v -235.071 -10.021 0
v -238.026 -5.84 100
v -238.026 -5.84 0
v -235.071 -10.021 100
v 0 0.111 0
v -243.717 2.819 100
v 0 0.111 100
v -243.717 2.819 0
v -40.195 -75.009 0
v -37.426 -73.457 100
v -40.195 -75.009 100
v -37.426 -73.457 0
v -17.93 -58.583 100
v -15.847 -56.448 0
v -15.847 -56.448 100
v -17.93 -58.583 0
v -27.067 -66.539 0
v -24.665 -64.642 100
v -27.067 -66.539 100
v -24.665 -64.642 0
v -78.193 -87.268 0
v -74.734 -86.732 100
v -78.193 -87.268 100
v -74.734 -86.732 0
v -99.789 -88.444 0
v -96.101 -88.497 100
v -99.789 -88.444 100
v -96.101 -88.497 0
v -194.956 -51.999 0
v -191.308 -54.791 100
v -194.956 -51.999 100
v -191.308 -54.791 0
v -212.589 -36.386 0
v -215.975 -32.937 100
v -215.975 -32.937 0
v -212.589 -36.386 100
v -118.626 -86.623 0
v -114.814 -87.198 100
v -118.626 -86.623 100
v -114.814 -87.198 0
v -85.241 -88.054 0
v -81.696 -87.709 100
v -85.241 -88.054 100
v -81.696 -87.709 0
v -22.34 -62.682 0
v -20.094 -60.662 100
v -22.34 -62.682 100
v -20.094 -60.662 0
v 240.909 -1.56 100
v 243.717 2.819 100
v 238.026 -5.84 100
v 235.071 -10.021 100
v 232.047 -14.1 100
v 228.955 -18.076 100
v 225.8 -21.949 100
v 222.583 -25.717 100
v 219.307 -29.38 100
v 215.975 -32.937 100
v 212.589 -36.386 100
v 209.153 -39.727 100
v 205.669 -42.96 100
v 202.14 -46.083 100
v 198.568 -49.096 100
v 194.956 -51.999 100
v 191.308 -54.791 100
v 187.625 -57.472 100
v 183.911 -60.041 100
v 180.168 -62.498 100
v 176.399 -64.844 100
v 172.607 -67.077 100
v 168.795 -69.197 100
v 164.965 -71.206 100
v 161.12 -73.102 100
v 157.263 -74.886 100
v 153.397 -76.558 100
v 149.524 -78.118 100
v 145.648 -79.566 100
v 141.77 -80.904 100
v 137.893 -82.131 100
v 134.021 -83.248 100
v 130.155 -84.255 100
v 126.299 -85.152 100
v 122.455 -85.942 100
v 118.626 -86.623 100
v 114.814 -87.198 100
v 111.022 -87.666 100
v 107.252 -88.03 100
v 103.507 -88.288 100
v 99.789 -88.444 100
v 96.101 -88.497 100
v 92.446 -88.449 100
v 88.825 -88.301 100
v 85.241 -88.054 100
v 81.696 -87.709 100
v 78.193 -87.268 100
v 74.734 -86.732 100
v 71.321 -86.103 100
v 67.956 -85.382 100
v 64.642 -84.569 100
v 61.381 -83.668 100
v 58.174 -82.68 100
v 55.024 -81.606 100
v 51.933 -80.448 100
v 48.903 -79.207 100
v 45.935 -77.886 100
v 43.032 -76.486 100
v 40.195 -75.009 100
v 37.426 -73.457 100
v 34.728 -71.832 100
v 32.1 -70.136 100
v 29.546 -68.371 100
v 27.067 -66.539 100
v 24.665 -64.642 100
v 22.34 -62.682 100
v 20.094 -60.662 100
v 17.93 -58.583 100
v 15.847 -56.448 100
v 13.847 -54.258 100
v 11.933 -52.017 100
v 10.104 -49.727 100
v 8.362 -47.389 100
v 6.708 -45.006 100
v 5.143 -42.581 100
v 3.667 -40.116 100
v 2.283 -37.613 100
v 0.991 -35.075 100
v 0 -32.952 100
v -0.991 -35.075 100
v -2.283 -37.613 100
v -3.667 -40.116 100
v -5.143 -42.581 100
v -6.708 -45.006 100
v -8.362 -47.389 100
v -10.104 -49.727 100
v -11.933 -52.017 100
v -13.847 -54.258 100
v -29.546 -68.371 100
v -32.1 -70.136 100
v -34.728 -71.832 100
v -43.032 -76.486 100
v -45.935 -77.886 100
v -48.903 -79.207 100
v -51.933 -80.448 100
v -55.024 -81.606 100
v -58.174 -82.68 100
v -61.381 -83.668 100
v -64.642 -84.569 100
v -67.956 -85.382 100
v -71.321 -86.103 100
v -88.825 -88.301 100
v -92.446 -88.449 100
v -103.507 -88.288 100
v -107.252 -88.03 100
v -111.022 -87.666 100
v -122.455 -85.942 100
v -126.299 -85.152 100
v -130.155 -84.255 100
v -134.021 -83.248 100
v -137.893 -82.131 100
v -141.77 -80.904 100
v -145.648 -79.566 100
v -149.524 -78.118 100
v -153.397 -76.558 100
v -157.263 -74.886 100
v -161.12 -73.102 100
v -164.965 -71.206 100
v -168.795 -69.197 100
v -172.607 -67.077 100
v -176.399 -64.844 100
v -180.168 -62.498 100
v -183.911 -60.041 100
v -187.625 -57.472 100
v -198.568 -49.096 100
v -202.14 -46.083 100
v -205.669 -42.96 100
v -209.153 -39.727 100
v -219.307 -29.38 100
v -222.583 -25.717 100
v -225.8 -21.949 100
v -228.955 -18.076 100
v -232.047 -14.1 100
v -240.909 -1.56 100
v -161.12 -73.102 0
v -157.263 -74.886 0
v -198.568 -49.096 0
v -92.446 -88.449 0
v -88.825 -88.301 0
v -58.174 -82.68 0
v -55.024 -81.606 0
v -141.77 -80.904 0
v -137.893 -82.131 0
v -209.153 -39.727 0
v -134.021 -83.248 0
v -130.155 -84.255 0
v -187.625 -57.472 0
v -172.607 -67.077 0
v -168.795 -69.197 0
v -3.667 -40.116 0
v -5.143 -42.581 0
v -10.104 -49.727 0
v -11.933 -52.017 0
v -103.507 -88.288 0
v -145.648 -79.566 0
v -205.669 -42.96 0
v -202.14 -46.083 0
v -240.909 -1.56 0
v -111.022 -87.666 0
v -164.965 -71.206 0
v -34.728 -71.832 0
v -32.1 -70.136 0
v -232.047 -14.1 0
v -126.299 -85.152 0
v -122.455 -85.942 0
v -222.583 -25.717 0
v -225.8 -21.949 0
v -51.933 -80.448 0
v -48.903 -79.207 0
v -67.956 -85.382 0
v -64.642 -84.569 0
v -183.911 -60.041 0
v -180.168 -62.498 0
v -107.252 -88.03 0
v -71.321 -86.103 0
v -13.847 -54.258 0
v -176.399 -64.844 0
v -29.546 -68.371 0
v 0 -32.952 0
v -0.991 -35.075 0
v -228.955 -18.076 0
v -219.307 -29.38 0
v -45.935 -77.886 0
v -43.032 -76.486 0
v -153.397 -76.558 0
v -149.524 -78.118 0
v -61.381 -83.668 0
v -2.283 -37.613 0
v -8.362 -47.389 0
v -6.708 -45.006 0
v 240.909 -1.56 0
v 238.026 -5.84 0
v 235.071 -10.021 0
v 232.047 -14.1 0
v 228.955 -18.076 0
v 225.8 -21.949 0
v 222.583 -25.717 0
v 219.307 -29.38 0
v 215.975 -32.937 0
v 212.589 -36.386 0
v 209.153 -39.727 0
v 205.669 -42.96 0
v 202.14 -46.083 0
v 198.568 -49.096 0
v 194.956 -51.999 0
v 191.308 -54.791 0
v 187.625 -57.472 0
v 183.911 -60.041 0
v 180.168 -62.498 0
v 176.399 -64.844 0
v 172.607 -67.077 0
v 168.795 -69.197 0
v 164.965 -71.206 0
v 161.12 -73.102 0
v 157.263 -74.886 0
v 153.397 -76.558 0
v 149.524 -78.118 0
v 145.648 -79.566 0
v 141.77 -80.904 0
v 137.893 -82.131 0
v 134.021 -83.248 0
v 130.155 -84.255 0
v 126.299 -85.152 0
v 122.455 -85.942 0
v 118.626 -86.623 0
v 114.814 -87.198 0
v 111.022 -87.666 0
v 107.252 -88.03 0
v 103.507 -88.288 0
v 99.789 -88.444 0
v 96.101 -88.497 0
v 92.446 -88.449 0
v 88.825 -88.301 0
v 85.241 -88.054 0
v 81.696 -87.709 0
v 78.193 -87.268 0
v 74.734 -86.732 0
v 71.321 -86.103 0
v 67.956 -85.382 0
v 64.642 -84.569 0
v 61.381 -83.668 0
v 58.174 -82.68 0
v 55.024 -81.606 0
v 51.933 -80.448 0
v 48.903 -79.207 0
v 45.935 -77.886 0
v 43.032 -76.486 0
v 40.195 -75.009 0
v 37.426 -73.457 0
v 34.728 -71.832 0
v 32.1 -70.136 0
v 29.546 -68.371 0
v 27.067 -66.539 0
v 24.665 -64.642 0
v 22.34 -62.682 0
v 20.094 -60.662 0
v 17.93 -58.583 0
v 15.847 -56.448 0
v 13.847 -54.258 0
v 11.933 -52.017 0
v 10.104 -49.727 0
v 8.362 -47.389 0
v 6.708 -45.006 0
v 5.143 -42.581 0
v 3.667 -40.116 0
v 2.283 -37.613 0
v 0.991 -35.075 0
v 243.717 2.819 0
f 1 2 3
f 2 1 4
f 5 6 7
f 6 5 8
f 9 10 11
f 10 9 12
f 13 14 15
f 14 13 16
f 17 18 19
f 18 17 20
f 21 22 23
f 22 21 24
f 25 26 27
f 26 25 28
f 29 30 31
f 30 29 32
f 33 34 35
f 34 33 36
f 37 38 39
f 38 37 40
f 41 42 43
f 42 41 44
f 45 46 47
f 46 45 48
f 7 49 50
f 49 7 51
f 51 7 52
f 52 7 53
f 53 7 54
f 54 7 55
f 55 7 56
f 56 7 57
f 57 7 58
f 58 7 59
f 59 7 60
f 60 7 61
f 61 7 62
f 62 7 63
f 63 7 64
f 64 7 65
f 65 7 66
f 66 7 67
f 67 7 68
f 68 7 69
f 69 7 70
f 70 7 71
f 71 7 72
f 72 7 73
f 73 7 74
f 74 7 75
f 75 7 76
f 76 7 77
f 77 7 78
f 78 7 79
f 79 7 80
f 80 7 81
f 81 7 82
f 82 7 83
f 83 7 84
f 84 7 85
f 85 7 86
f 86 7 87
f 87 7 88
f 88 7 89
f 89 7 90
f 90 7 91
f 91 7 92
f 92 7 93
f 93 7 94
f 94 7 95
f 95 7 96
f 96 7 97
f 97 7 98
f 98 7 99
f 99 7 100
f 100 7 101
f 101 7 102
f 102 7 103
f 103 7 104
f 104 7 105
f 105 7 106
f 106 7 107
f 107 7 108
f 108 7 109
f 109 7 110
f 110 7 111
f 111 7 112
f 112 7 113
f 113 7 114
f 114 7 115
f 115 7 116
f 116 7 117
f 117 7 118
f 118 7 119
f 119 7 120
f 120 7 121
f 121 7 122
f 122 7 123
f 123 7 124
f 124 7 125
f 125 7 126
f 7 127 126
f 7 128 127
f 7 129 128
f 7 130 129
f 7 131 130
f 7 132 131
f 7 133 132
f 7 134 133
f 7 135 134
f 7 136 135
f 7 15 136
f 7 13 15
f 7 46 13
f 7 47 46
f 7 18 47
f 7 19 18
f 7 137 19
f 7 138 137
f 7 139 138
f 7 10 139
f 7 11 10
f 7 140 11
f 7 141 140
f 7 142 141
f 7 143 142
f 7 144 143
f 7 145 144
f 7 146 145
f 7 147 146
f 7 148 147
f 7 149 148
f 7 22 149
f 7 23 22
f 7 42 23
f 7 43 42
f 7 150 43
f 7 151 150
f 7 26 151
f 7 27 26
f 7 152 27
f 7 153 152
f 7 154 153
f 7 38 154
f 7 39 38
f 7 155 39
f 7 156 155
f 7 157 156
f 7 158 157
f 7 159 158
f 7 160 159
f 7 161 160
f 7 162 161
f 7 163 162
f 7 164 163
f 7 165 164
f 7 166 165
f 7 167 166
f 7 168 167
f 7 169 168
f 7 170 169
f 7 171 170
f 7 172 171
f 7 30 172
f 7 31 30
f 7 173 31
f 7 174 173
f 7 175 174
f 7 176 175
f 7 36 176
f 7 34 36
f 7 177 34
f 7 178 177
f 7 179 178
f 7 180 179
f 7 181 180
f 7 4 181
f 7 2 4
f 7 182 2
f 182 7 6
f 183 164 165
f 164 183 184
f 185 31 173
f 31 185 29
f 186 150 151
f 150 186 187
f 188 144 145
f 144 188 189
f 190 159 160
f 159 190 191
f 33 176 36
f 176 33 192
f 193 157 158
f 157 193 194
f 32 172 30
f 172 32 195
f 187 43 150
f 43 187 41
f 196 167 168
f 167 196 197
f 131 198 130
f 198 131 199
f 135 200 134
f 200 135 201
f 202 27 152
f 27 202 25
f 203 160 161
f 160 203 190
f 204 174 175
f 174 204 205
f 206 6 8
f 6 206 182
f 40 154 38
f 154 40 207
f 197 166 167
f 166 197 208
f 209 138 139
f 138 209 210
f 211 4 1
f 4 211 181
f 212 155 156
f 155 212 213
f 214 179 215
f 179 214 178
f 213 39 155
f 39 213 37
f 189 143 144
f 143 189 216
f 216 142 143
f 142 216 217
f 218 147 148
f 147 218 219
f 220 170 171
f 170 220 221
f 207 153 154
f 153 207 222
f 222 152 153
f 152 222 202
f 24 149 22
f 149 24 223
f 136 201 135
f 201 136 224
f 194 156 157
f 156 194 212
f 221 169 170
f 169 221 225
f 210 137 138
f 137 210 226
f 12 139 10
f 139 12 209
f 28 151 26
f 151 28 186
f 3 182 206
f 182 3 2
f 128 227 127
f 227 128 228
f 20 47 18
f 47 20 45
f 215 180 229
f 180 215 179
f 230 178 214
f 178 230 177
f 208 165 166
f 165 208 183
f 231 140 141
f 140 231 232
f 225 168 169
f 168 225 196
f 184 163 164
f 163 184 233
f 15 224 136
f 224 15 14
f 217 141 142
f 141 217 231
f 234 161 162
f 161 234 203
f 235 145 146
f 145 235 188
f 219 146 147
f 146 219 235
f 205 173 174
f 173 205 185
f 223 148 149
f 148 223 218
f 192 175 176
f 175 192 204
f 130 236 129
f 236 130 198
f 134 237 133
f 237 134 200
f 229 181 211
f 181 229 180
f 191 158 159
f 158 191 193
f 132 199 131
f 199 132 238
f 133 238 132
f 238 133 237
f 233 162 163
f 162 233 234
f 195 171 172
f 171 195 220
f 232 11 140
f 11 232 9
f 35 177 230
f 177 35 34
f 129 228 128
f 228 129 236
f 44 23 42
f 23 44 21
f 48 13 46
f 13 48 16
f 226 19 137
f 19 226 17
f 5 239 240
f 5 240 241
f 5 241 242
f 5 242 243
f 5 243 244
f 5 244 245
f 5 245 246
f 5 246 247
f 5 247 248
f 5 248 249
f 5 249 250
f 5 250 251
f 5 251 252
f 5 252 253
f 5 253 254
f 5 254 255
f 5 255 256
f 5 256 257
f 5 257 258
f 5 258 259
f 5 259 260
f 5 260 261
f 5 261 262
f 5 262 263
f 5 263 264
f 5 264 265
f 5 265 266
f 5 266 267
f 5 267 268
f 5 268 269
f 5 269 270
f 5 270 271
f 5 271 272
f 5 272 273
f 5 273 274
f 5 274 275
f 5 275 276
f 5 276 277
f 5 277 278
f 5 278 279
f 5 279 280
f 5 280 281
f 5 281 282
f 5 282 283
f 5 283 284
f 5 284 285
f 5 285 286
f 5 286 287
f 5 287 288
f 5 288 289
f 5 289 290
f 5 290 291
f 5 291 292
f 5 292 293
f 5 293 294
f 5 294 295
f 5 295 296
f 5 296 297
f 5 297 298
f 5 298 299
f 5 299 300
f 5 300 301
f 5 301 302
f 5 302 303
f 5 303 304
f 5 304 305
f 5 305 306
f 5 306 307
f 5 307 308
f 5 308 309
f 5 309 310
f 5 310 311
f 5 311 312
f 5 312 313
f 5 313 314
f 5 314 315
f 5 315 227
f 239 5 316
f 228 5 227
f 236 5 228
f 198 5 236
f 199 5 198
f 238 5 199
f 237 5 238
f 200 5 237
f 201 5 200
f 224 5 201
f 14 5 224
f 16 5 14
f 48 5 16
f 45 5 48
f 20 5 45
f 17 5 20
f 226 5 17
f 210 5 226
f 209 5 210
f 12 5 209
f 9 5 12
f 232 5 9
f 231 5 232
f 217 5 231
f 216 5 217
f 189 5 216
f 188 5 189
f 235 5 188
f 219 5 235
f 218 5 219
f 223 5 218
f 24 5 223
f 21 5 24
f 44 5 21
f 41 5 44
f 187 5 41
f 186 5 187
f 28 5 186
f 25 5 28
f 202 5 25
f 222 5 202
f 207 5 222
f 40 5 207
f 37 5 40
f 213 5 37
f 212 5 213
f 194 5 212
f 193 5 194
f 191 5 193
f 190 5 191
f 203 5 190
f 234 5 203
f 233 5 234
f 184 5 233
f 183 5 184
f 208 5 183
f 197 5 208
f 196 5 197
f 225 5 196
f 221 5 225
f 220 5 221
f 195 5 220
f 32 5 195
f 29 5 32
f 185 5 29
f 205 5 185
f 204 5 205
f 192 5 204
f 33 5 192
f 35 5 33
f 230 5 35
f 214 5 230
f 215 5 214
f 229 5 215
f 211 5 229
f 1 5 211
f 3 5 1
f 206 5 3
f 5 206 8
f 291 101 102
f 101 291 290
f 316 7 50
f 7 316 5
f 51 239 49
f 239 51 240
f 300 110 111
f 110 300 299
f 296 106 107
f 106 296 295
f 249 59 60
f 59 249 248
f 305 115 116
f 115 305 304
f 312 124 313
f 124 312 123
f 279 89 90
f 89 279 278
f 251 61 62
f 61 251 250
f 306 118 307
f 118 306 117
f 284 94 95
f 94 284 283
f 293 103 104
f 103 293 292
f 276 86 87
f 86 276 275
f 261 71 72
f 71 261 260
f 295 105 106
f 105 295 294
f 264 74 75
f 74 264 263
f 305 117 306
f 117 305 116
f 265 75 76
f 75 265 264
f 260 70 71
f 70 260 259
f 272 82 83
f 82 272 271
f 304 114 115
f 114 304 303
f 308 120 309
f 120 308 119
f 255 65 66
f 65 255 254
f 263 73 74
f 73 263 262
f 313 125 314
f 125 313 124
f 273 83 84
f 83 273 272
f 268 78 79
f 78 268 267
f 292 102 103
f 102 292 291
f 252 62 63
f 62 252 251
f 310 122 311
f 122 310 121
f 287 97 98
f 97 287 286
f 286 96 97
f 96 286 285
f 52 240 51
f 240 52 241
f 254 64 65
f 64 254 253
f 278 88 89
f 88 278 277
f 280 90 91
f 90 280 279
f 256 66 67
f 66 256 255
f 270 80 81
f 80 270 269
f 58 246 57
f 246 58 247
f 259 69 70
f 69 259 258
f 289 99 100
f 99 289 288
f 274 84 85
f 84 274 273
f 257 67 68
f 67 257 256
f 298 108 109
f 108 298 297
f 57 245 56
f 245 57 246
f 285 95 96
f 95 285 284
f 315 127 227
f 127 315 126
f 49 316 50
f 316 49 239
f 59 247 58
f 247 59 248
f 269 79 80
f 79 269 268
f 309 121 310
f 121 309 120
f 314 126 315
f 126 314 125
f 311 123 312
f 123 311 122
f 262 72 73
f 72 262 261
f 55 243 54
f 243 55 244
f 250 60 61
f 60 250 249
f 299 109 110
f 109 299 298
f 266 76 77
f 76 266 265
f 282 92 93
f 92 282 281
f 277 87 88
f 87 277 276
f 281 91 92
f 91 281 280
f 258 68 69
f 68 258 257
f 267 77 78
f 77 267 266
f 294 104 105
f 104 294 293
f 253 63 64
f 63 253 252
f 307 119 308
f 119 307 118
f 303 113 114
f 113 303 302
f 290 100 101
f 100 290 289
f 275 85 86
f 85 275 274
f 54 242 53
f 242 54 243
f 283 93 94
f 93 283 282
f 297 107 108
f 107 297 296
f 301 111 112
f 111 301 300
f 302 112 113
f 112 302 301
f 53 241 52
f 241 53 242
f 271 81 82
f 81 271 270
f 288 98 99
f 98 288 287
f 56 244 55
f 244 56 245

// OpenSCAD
// pitch circle diameter
PCD=3;
// pressure angle
PA=20;
// base circle calculation from Gears and Gear Cutting, Ivan Law, page
// 26, figure 26
base=PCD*cos(PA);

// diametral pitch
DP=20;
// working depth of tooth (from Machinery's Handbook)
D=2/DP;
// minimum whole depth (working depth + clearance, aka "D+f") (from
// Machinery's Handbook)
Df=2.157/DP;
// "addendum" (amount of tooth above the PCD, so PCD+2*addendum = gear
// blank size) (from Machinery's Handbook)
addendum=1/DP;
blankdiameter = PCD + 2*addendum;

pi=3.14159265;
// intersection() {
	translate([10,0,0]) {
		linear_extrude(h=10) {
			for(theta=[0:1:89]) {
				assign(theta2=theta+1) {
					polygon(points=[[0,0], 
							[-base*(theta*sin(theta)+cos(theta)), 
								base*(sin(theta)-theta*cos(theta))],
							[-base*(theta2*sin(theta2)+cos(theta2)), 
								base*(sin(theta2)-theta2*cos(theta2))],
						],
						paths=[[0,1,2]]);
				}
			}
		}
	}
	translate([-10,0,0]) {
		linear_extrude(h=10) {
			for(theta=[0:1:89]) {
				assign(theta2=theta+1) {
					polygon(points=[[0,0], 
							[base*(theta*sin(theta)+cos(theta)), 
								base*(sin(theta)-theta*cos(theta))],
							[base*(theta2*sin(theta2)+cos(theta2)), 
								base*(sin(theta2)-theta2*cos(theta2))],
						],
						paths=[[0,1,2]]);
				}
			}
		}
	}
// }
